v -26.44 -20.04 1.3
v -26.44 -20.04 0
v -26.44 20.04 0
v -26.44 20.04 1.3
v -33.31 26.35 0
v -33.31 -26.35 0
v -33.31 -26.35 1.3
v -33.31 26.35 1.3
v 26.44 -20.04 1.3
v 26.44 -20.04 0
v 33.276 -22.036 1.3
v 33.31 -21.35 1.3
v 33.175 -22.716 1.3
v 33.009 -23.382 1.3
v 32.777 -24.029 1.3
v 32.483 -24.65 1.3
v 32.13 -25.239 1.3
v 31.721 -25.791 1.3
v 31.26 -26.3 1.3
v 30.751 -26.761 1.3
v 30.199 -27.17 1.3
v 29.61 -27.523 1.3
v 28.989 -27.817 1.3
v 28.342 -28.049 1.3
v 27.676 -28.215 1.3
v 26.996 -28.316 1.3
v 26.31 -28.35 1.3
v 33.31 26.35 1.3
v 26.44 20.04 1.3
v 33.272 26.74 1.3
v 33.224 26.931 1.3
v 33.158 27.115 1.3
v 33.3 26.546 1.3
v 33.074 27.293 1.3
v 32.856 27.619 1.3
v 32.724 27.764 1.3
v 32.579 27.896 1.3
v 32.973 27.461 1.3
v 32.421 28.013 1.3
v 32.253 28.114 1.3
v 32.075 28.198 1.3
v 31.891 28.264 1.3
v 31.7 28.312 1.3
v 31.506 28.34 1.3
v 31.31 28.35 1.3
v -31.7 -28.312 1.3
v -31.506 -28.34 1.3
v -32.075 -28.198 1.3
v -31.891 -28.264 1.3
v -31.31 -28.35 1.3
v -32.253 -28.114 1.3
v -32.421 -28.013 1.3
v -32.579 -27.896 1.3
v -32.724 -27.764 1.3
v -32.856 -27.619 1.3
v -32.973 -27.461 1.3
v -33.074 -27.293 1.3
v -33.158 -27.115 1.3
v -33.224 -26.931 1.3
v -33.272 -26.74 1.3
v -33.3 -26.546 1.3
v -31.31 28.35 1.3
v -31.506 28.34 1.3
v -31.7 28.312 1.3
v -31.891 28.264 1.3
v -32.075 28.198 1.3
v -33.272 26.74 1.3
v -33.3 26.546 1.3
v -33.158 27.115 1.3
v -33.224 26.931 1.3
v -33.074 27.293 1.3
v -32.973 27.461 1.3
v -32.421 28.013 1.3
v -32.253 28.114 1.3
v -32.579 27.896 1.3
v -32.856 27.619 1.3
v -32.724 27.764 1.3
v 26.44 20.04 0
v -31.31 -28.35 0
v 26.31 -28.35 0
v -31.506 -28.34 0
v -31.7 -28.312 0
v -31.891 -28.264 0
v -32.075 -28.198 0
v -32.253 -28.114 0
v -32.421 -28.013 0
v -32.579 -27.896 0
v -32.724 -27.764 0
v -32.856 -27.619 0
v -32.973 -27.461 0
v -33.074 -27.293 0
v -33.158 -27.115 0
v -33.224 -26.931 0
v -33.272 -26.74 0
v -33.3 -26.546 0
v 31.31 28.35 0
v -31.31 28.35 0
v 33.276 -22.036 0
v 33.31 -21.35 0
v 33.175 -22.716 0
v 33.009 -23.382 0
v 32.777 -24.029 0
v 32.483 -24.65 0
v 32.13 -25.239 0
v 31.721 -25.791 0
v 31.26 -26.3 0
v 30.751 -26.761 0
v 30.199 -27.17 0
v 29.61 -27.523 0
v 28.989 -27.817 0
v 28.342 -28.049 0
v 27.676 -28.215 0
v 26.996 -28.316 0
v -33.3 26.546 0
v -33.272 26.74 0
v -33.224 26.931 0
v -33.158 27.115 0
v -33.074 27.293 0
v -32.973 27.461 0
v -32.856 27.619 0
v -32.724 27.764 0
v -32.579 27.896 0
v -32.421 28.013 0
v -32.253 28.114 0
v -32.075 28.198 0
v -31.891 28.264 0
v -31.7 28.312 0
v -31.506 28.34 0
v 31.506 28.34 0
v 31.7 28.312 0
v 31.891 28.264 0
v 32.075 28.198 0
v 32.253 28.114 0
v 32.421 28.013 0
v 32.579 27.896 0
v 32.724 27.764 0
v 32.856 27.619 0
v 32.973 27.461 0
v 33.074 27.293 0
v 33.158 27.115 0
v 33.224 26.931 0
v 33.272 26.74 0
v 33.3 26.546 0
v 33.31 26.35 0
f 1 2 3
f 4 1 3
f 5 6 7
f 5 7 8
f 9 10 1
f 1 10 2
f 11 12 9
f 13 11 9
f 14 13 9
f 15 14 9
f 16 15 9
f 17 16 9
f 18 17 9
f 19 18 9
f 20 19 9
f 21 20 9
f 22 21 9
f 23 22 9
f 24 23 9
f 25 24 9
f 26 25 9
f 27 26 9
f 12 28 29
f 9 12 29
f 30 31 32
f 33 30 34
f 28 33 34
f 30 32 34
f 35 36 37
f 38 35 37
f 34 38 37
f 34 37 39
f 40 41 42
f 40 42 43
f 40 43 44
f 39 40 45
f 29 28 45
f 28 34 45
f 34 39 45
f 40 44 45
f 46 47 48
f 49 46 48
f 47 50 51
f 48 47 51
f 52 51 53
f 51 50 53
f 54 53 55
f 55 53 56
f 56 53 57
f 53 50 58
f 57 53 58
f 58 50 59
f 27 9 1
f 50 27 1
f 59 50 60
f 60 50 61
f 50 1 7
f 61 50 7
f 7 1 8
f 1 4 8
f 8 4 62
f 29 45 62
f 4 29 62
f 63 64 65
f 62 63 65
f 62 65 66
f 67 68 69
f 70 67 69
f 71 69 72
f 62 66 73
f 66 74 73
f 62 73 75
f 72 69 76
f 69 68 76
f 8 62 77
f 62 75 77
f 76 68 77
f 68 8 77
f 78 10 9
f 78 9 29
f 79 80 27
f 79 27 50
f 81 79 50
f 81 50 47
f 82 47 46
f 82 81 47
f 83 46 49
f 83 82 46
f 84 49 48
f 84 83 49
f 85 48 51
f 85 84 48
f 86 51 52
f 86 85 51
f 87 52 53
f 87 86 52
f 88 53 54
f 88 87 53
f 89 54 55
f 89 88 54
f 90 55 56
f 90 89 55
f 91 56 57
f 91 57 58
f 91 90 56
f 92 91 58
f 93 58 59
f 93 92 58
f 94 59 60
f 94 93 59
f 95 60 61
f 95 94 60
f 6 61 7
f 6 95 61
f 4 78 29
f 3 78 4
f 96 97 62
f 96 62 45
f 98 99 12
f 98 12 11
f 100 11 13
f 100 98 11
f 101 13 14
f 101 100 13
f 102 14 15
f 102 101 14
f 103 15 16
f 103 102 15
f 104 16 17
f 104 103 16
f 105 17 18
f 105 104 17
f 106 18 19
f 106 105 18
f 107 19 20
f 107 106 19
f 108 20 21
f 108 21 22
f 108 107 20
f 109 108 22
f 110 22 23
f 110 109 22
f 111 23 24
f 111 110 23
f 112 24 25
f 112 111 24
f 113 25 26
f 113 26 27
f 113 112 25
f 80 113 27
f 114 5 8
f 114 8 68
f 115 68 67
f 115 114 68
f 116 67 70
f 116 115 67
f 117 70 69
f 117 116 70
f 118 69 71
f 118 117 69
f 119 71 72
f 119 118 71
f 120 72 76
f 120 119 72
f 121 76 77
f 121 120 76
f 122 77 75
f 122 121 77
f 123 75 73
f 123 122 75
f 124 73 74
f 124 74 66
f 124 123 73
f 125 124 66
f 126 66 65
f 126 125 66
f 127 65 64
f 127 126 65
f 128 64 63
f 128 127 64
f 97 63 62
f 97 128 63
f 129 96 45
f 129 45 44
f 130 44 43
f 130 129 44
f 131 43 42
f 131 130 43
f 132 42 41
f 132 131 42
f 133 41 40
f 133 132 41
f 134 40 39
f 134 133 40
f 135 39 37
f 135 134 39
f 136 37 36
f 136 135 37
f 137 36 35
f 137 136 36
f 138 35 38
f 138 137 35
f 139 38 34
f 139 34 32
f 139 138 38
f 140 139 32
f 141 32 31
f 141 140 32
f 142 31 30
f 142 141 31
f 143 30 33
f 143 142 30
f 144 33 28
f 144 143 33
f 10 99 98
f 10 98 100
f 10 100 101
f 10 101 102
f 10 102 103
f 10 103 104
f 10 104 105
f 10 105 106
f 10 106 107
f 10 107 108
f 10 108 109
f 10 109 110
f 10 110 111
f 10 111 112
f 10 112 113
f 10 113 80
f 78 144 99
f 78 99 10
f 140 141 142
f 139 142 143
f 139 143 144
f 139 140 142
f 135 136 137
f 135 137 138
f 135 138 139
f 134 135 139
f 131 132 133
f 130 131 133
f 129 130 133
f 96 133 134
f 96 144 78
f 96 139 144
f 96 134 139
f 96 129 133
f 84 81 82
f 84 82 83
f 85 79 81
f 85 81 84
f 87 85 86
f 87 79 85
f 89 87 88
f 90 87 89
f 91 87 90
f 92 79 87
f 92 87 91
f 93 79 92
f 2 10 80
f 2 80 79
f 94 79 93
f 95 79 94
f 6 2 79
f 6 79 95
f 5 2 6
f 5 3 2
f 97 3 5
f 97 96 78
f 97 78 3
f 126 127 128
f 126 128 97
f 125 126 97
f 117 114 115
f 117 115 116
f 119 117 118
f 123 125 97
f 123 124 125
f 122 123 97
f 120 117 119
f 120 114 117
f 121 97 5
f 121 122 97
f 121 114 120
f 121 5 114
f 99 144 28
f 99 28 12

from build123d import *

# Parameters (mm, degrees)
BOSS_EXTRUDE1_DEPTH = 1.3
SKETCH2_W           = 52.88
SKETCH2_H           = 40.08
CUT_EXTRUDE1_DEPTH  = 44.760354203


with BuildPart() as part:
    # Sketch1 → Boss-Extrude1 (new body)
    with BuildSketch(Plane.XY):
        with BuildLine():
            Line((-31.31, 28.35), (31.31, 28.35))
            ThreePointArc((31.31, 28.35), (32.724213562, 27.764213562), (33.31, 26.35))
            Line((33.31, 26.35), (33.31, -21.35))
            ThreePointArc((33.31, -21.35), (31.259747468, -26.299747468), (26.31, -28.35))
            Line((26.31, -28.35), (-31.31, -28.35))
            ThreePointArc((-31.31, -28.35), (-32.724213562, -27.764213562), (-33.31, -26.35))
            Line((-33.31, -26.35), (-33.31, 26.35))
            ThreePointArc((-33.31, 26.35), (-32.724213562, 27.764213562), (-31.31, 28.35))
        make_face()
    extrude(amount=BOSS_EXTRUDE1_DEPTH)

    # Sketch2 → Cut-Extrude1 (cut, through all)
    with BuildSketch(Plane(origin=(0, 0, 0), x_dir=(-1, 0, 0), z_dir=(0, 0, -1))):
        Rectangle(SKETCH2_W, SKETCH2_H)
    extrude(amount=-CUT_EXTRUDE1_DEPTH, mode=Mode.SUBTRACT)


solid = part.part
